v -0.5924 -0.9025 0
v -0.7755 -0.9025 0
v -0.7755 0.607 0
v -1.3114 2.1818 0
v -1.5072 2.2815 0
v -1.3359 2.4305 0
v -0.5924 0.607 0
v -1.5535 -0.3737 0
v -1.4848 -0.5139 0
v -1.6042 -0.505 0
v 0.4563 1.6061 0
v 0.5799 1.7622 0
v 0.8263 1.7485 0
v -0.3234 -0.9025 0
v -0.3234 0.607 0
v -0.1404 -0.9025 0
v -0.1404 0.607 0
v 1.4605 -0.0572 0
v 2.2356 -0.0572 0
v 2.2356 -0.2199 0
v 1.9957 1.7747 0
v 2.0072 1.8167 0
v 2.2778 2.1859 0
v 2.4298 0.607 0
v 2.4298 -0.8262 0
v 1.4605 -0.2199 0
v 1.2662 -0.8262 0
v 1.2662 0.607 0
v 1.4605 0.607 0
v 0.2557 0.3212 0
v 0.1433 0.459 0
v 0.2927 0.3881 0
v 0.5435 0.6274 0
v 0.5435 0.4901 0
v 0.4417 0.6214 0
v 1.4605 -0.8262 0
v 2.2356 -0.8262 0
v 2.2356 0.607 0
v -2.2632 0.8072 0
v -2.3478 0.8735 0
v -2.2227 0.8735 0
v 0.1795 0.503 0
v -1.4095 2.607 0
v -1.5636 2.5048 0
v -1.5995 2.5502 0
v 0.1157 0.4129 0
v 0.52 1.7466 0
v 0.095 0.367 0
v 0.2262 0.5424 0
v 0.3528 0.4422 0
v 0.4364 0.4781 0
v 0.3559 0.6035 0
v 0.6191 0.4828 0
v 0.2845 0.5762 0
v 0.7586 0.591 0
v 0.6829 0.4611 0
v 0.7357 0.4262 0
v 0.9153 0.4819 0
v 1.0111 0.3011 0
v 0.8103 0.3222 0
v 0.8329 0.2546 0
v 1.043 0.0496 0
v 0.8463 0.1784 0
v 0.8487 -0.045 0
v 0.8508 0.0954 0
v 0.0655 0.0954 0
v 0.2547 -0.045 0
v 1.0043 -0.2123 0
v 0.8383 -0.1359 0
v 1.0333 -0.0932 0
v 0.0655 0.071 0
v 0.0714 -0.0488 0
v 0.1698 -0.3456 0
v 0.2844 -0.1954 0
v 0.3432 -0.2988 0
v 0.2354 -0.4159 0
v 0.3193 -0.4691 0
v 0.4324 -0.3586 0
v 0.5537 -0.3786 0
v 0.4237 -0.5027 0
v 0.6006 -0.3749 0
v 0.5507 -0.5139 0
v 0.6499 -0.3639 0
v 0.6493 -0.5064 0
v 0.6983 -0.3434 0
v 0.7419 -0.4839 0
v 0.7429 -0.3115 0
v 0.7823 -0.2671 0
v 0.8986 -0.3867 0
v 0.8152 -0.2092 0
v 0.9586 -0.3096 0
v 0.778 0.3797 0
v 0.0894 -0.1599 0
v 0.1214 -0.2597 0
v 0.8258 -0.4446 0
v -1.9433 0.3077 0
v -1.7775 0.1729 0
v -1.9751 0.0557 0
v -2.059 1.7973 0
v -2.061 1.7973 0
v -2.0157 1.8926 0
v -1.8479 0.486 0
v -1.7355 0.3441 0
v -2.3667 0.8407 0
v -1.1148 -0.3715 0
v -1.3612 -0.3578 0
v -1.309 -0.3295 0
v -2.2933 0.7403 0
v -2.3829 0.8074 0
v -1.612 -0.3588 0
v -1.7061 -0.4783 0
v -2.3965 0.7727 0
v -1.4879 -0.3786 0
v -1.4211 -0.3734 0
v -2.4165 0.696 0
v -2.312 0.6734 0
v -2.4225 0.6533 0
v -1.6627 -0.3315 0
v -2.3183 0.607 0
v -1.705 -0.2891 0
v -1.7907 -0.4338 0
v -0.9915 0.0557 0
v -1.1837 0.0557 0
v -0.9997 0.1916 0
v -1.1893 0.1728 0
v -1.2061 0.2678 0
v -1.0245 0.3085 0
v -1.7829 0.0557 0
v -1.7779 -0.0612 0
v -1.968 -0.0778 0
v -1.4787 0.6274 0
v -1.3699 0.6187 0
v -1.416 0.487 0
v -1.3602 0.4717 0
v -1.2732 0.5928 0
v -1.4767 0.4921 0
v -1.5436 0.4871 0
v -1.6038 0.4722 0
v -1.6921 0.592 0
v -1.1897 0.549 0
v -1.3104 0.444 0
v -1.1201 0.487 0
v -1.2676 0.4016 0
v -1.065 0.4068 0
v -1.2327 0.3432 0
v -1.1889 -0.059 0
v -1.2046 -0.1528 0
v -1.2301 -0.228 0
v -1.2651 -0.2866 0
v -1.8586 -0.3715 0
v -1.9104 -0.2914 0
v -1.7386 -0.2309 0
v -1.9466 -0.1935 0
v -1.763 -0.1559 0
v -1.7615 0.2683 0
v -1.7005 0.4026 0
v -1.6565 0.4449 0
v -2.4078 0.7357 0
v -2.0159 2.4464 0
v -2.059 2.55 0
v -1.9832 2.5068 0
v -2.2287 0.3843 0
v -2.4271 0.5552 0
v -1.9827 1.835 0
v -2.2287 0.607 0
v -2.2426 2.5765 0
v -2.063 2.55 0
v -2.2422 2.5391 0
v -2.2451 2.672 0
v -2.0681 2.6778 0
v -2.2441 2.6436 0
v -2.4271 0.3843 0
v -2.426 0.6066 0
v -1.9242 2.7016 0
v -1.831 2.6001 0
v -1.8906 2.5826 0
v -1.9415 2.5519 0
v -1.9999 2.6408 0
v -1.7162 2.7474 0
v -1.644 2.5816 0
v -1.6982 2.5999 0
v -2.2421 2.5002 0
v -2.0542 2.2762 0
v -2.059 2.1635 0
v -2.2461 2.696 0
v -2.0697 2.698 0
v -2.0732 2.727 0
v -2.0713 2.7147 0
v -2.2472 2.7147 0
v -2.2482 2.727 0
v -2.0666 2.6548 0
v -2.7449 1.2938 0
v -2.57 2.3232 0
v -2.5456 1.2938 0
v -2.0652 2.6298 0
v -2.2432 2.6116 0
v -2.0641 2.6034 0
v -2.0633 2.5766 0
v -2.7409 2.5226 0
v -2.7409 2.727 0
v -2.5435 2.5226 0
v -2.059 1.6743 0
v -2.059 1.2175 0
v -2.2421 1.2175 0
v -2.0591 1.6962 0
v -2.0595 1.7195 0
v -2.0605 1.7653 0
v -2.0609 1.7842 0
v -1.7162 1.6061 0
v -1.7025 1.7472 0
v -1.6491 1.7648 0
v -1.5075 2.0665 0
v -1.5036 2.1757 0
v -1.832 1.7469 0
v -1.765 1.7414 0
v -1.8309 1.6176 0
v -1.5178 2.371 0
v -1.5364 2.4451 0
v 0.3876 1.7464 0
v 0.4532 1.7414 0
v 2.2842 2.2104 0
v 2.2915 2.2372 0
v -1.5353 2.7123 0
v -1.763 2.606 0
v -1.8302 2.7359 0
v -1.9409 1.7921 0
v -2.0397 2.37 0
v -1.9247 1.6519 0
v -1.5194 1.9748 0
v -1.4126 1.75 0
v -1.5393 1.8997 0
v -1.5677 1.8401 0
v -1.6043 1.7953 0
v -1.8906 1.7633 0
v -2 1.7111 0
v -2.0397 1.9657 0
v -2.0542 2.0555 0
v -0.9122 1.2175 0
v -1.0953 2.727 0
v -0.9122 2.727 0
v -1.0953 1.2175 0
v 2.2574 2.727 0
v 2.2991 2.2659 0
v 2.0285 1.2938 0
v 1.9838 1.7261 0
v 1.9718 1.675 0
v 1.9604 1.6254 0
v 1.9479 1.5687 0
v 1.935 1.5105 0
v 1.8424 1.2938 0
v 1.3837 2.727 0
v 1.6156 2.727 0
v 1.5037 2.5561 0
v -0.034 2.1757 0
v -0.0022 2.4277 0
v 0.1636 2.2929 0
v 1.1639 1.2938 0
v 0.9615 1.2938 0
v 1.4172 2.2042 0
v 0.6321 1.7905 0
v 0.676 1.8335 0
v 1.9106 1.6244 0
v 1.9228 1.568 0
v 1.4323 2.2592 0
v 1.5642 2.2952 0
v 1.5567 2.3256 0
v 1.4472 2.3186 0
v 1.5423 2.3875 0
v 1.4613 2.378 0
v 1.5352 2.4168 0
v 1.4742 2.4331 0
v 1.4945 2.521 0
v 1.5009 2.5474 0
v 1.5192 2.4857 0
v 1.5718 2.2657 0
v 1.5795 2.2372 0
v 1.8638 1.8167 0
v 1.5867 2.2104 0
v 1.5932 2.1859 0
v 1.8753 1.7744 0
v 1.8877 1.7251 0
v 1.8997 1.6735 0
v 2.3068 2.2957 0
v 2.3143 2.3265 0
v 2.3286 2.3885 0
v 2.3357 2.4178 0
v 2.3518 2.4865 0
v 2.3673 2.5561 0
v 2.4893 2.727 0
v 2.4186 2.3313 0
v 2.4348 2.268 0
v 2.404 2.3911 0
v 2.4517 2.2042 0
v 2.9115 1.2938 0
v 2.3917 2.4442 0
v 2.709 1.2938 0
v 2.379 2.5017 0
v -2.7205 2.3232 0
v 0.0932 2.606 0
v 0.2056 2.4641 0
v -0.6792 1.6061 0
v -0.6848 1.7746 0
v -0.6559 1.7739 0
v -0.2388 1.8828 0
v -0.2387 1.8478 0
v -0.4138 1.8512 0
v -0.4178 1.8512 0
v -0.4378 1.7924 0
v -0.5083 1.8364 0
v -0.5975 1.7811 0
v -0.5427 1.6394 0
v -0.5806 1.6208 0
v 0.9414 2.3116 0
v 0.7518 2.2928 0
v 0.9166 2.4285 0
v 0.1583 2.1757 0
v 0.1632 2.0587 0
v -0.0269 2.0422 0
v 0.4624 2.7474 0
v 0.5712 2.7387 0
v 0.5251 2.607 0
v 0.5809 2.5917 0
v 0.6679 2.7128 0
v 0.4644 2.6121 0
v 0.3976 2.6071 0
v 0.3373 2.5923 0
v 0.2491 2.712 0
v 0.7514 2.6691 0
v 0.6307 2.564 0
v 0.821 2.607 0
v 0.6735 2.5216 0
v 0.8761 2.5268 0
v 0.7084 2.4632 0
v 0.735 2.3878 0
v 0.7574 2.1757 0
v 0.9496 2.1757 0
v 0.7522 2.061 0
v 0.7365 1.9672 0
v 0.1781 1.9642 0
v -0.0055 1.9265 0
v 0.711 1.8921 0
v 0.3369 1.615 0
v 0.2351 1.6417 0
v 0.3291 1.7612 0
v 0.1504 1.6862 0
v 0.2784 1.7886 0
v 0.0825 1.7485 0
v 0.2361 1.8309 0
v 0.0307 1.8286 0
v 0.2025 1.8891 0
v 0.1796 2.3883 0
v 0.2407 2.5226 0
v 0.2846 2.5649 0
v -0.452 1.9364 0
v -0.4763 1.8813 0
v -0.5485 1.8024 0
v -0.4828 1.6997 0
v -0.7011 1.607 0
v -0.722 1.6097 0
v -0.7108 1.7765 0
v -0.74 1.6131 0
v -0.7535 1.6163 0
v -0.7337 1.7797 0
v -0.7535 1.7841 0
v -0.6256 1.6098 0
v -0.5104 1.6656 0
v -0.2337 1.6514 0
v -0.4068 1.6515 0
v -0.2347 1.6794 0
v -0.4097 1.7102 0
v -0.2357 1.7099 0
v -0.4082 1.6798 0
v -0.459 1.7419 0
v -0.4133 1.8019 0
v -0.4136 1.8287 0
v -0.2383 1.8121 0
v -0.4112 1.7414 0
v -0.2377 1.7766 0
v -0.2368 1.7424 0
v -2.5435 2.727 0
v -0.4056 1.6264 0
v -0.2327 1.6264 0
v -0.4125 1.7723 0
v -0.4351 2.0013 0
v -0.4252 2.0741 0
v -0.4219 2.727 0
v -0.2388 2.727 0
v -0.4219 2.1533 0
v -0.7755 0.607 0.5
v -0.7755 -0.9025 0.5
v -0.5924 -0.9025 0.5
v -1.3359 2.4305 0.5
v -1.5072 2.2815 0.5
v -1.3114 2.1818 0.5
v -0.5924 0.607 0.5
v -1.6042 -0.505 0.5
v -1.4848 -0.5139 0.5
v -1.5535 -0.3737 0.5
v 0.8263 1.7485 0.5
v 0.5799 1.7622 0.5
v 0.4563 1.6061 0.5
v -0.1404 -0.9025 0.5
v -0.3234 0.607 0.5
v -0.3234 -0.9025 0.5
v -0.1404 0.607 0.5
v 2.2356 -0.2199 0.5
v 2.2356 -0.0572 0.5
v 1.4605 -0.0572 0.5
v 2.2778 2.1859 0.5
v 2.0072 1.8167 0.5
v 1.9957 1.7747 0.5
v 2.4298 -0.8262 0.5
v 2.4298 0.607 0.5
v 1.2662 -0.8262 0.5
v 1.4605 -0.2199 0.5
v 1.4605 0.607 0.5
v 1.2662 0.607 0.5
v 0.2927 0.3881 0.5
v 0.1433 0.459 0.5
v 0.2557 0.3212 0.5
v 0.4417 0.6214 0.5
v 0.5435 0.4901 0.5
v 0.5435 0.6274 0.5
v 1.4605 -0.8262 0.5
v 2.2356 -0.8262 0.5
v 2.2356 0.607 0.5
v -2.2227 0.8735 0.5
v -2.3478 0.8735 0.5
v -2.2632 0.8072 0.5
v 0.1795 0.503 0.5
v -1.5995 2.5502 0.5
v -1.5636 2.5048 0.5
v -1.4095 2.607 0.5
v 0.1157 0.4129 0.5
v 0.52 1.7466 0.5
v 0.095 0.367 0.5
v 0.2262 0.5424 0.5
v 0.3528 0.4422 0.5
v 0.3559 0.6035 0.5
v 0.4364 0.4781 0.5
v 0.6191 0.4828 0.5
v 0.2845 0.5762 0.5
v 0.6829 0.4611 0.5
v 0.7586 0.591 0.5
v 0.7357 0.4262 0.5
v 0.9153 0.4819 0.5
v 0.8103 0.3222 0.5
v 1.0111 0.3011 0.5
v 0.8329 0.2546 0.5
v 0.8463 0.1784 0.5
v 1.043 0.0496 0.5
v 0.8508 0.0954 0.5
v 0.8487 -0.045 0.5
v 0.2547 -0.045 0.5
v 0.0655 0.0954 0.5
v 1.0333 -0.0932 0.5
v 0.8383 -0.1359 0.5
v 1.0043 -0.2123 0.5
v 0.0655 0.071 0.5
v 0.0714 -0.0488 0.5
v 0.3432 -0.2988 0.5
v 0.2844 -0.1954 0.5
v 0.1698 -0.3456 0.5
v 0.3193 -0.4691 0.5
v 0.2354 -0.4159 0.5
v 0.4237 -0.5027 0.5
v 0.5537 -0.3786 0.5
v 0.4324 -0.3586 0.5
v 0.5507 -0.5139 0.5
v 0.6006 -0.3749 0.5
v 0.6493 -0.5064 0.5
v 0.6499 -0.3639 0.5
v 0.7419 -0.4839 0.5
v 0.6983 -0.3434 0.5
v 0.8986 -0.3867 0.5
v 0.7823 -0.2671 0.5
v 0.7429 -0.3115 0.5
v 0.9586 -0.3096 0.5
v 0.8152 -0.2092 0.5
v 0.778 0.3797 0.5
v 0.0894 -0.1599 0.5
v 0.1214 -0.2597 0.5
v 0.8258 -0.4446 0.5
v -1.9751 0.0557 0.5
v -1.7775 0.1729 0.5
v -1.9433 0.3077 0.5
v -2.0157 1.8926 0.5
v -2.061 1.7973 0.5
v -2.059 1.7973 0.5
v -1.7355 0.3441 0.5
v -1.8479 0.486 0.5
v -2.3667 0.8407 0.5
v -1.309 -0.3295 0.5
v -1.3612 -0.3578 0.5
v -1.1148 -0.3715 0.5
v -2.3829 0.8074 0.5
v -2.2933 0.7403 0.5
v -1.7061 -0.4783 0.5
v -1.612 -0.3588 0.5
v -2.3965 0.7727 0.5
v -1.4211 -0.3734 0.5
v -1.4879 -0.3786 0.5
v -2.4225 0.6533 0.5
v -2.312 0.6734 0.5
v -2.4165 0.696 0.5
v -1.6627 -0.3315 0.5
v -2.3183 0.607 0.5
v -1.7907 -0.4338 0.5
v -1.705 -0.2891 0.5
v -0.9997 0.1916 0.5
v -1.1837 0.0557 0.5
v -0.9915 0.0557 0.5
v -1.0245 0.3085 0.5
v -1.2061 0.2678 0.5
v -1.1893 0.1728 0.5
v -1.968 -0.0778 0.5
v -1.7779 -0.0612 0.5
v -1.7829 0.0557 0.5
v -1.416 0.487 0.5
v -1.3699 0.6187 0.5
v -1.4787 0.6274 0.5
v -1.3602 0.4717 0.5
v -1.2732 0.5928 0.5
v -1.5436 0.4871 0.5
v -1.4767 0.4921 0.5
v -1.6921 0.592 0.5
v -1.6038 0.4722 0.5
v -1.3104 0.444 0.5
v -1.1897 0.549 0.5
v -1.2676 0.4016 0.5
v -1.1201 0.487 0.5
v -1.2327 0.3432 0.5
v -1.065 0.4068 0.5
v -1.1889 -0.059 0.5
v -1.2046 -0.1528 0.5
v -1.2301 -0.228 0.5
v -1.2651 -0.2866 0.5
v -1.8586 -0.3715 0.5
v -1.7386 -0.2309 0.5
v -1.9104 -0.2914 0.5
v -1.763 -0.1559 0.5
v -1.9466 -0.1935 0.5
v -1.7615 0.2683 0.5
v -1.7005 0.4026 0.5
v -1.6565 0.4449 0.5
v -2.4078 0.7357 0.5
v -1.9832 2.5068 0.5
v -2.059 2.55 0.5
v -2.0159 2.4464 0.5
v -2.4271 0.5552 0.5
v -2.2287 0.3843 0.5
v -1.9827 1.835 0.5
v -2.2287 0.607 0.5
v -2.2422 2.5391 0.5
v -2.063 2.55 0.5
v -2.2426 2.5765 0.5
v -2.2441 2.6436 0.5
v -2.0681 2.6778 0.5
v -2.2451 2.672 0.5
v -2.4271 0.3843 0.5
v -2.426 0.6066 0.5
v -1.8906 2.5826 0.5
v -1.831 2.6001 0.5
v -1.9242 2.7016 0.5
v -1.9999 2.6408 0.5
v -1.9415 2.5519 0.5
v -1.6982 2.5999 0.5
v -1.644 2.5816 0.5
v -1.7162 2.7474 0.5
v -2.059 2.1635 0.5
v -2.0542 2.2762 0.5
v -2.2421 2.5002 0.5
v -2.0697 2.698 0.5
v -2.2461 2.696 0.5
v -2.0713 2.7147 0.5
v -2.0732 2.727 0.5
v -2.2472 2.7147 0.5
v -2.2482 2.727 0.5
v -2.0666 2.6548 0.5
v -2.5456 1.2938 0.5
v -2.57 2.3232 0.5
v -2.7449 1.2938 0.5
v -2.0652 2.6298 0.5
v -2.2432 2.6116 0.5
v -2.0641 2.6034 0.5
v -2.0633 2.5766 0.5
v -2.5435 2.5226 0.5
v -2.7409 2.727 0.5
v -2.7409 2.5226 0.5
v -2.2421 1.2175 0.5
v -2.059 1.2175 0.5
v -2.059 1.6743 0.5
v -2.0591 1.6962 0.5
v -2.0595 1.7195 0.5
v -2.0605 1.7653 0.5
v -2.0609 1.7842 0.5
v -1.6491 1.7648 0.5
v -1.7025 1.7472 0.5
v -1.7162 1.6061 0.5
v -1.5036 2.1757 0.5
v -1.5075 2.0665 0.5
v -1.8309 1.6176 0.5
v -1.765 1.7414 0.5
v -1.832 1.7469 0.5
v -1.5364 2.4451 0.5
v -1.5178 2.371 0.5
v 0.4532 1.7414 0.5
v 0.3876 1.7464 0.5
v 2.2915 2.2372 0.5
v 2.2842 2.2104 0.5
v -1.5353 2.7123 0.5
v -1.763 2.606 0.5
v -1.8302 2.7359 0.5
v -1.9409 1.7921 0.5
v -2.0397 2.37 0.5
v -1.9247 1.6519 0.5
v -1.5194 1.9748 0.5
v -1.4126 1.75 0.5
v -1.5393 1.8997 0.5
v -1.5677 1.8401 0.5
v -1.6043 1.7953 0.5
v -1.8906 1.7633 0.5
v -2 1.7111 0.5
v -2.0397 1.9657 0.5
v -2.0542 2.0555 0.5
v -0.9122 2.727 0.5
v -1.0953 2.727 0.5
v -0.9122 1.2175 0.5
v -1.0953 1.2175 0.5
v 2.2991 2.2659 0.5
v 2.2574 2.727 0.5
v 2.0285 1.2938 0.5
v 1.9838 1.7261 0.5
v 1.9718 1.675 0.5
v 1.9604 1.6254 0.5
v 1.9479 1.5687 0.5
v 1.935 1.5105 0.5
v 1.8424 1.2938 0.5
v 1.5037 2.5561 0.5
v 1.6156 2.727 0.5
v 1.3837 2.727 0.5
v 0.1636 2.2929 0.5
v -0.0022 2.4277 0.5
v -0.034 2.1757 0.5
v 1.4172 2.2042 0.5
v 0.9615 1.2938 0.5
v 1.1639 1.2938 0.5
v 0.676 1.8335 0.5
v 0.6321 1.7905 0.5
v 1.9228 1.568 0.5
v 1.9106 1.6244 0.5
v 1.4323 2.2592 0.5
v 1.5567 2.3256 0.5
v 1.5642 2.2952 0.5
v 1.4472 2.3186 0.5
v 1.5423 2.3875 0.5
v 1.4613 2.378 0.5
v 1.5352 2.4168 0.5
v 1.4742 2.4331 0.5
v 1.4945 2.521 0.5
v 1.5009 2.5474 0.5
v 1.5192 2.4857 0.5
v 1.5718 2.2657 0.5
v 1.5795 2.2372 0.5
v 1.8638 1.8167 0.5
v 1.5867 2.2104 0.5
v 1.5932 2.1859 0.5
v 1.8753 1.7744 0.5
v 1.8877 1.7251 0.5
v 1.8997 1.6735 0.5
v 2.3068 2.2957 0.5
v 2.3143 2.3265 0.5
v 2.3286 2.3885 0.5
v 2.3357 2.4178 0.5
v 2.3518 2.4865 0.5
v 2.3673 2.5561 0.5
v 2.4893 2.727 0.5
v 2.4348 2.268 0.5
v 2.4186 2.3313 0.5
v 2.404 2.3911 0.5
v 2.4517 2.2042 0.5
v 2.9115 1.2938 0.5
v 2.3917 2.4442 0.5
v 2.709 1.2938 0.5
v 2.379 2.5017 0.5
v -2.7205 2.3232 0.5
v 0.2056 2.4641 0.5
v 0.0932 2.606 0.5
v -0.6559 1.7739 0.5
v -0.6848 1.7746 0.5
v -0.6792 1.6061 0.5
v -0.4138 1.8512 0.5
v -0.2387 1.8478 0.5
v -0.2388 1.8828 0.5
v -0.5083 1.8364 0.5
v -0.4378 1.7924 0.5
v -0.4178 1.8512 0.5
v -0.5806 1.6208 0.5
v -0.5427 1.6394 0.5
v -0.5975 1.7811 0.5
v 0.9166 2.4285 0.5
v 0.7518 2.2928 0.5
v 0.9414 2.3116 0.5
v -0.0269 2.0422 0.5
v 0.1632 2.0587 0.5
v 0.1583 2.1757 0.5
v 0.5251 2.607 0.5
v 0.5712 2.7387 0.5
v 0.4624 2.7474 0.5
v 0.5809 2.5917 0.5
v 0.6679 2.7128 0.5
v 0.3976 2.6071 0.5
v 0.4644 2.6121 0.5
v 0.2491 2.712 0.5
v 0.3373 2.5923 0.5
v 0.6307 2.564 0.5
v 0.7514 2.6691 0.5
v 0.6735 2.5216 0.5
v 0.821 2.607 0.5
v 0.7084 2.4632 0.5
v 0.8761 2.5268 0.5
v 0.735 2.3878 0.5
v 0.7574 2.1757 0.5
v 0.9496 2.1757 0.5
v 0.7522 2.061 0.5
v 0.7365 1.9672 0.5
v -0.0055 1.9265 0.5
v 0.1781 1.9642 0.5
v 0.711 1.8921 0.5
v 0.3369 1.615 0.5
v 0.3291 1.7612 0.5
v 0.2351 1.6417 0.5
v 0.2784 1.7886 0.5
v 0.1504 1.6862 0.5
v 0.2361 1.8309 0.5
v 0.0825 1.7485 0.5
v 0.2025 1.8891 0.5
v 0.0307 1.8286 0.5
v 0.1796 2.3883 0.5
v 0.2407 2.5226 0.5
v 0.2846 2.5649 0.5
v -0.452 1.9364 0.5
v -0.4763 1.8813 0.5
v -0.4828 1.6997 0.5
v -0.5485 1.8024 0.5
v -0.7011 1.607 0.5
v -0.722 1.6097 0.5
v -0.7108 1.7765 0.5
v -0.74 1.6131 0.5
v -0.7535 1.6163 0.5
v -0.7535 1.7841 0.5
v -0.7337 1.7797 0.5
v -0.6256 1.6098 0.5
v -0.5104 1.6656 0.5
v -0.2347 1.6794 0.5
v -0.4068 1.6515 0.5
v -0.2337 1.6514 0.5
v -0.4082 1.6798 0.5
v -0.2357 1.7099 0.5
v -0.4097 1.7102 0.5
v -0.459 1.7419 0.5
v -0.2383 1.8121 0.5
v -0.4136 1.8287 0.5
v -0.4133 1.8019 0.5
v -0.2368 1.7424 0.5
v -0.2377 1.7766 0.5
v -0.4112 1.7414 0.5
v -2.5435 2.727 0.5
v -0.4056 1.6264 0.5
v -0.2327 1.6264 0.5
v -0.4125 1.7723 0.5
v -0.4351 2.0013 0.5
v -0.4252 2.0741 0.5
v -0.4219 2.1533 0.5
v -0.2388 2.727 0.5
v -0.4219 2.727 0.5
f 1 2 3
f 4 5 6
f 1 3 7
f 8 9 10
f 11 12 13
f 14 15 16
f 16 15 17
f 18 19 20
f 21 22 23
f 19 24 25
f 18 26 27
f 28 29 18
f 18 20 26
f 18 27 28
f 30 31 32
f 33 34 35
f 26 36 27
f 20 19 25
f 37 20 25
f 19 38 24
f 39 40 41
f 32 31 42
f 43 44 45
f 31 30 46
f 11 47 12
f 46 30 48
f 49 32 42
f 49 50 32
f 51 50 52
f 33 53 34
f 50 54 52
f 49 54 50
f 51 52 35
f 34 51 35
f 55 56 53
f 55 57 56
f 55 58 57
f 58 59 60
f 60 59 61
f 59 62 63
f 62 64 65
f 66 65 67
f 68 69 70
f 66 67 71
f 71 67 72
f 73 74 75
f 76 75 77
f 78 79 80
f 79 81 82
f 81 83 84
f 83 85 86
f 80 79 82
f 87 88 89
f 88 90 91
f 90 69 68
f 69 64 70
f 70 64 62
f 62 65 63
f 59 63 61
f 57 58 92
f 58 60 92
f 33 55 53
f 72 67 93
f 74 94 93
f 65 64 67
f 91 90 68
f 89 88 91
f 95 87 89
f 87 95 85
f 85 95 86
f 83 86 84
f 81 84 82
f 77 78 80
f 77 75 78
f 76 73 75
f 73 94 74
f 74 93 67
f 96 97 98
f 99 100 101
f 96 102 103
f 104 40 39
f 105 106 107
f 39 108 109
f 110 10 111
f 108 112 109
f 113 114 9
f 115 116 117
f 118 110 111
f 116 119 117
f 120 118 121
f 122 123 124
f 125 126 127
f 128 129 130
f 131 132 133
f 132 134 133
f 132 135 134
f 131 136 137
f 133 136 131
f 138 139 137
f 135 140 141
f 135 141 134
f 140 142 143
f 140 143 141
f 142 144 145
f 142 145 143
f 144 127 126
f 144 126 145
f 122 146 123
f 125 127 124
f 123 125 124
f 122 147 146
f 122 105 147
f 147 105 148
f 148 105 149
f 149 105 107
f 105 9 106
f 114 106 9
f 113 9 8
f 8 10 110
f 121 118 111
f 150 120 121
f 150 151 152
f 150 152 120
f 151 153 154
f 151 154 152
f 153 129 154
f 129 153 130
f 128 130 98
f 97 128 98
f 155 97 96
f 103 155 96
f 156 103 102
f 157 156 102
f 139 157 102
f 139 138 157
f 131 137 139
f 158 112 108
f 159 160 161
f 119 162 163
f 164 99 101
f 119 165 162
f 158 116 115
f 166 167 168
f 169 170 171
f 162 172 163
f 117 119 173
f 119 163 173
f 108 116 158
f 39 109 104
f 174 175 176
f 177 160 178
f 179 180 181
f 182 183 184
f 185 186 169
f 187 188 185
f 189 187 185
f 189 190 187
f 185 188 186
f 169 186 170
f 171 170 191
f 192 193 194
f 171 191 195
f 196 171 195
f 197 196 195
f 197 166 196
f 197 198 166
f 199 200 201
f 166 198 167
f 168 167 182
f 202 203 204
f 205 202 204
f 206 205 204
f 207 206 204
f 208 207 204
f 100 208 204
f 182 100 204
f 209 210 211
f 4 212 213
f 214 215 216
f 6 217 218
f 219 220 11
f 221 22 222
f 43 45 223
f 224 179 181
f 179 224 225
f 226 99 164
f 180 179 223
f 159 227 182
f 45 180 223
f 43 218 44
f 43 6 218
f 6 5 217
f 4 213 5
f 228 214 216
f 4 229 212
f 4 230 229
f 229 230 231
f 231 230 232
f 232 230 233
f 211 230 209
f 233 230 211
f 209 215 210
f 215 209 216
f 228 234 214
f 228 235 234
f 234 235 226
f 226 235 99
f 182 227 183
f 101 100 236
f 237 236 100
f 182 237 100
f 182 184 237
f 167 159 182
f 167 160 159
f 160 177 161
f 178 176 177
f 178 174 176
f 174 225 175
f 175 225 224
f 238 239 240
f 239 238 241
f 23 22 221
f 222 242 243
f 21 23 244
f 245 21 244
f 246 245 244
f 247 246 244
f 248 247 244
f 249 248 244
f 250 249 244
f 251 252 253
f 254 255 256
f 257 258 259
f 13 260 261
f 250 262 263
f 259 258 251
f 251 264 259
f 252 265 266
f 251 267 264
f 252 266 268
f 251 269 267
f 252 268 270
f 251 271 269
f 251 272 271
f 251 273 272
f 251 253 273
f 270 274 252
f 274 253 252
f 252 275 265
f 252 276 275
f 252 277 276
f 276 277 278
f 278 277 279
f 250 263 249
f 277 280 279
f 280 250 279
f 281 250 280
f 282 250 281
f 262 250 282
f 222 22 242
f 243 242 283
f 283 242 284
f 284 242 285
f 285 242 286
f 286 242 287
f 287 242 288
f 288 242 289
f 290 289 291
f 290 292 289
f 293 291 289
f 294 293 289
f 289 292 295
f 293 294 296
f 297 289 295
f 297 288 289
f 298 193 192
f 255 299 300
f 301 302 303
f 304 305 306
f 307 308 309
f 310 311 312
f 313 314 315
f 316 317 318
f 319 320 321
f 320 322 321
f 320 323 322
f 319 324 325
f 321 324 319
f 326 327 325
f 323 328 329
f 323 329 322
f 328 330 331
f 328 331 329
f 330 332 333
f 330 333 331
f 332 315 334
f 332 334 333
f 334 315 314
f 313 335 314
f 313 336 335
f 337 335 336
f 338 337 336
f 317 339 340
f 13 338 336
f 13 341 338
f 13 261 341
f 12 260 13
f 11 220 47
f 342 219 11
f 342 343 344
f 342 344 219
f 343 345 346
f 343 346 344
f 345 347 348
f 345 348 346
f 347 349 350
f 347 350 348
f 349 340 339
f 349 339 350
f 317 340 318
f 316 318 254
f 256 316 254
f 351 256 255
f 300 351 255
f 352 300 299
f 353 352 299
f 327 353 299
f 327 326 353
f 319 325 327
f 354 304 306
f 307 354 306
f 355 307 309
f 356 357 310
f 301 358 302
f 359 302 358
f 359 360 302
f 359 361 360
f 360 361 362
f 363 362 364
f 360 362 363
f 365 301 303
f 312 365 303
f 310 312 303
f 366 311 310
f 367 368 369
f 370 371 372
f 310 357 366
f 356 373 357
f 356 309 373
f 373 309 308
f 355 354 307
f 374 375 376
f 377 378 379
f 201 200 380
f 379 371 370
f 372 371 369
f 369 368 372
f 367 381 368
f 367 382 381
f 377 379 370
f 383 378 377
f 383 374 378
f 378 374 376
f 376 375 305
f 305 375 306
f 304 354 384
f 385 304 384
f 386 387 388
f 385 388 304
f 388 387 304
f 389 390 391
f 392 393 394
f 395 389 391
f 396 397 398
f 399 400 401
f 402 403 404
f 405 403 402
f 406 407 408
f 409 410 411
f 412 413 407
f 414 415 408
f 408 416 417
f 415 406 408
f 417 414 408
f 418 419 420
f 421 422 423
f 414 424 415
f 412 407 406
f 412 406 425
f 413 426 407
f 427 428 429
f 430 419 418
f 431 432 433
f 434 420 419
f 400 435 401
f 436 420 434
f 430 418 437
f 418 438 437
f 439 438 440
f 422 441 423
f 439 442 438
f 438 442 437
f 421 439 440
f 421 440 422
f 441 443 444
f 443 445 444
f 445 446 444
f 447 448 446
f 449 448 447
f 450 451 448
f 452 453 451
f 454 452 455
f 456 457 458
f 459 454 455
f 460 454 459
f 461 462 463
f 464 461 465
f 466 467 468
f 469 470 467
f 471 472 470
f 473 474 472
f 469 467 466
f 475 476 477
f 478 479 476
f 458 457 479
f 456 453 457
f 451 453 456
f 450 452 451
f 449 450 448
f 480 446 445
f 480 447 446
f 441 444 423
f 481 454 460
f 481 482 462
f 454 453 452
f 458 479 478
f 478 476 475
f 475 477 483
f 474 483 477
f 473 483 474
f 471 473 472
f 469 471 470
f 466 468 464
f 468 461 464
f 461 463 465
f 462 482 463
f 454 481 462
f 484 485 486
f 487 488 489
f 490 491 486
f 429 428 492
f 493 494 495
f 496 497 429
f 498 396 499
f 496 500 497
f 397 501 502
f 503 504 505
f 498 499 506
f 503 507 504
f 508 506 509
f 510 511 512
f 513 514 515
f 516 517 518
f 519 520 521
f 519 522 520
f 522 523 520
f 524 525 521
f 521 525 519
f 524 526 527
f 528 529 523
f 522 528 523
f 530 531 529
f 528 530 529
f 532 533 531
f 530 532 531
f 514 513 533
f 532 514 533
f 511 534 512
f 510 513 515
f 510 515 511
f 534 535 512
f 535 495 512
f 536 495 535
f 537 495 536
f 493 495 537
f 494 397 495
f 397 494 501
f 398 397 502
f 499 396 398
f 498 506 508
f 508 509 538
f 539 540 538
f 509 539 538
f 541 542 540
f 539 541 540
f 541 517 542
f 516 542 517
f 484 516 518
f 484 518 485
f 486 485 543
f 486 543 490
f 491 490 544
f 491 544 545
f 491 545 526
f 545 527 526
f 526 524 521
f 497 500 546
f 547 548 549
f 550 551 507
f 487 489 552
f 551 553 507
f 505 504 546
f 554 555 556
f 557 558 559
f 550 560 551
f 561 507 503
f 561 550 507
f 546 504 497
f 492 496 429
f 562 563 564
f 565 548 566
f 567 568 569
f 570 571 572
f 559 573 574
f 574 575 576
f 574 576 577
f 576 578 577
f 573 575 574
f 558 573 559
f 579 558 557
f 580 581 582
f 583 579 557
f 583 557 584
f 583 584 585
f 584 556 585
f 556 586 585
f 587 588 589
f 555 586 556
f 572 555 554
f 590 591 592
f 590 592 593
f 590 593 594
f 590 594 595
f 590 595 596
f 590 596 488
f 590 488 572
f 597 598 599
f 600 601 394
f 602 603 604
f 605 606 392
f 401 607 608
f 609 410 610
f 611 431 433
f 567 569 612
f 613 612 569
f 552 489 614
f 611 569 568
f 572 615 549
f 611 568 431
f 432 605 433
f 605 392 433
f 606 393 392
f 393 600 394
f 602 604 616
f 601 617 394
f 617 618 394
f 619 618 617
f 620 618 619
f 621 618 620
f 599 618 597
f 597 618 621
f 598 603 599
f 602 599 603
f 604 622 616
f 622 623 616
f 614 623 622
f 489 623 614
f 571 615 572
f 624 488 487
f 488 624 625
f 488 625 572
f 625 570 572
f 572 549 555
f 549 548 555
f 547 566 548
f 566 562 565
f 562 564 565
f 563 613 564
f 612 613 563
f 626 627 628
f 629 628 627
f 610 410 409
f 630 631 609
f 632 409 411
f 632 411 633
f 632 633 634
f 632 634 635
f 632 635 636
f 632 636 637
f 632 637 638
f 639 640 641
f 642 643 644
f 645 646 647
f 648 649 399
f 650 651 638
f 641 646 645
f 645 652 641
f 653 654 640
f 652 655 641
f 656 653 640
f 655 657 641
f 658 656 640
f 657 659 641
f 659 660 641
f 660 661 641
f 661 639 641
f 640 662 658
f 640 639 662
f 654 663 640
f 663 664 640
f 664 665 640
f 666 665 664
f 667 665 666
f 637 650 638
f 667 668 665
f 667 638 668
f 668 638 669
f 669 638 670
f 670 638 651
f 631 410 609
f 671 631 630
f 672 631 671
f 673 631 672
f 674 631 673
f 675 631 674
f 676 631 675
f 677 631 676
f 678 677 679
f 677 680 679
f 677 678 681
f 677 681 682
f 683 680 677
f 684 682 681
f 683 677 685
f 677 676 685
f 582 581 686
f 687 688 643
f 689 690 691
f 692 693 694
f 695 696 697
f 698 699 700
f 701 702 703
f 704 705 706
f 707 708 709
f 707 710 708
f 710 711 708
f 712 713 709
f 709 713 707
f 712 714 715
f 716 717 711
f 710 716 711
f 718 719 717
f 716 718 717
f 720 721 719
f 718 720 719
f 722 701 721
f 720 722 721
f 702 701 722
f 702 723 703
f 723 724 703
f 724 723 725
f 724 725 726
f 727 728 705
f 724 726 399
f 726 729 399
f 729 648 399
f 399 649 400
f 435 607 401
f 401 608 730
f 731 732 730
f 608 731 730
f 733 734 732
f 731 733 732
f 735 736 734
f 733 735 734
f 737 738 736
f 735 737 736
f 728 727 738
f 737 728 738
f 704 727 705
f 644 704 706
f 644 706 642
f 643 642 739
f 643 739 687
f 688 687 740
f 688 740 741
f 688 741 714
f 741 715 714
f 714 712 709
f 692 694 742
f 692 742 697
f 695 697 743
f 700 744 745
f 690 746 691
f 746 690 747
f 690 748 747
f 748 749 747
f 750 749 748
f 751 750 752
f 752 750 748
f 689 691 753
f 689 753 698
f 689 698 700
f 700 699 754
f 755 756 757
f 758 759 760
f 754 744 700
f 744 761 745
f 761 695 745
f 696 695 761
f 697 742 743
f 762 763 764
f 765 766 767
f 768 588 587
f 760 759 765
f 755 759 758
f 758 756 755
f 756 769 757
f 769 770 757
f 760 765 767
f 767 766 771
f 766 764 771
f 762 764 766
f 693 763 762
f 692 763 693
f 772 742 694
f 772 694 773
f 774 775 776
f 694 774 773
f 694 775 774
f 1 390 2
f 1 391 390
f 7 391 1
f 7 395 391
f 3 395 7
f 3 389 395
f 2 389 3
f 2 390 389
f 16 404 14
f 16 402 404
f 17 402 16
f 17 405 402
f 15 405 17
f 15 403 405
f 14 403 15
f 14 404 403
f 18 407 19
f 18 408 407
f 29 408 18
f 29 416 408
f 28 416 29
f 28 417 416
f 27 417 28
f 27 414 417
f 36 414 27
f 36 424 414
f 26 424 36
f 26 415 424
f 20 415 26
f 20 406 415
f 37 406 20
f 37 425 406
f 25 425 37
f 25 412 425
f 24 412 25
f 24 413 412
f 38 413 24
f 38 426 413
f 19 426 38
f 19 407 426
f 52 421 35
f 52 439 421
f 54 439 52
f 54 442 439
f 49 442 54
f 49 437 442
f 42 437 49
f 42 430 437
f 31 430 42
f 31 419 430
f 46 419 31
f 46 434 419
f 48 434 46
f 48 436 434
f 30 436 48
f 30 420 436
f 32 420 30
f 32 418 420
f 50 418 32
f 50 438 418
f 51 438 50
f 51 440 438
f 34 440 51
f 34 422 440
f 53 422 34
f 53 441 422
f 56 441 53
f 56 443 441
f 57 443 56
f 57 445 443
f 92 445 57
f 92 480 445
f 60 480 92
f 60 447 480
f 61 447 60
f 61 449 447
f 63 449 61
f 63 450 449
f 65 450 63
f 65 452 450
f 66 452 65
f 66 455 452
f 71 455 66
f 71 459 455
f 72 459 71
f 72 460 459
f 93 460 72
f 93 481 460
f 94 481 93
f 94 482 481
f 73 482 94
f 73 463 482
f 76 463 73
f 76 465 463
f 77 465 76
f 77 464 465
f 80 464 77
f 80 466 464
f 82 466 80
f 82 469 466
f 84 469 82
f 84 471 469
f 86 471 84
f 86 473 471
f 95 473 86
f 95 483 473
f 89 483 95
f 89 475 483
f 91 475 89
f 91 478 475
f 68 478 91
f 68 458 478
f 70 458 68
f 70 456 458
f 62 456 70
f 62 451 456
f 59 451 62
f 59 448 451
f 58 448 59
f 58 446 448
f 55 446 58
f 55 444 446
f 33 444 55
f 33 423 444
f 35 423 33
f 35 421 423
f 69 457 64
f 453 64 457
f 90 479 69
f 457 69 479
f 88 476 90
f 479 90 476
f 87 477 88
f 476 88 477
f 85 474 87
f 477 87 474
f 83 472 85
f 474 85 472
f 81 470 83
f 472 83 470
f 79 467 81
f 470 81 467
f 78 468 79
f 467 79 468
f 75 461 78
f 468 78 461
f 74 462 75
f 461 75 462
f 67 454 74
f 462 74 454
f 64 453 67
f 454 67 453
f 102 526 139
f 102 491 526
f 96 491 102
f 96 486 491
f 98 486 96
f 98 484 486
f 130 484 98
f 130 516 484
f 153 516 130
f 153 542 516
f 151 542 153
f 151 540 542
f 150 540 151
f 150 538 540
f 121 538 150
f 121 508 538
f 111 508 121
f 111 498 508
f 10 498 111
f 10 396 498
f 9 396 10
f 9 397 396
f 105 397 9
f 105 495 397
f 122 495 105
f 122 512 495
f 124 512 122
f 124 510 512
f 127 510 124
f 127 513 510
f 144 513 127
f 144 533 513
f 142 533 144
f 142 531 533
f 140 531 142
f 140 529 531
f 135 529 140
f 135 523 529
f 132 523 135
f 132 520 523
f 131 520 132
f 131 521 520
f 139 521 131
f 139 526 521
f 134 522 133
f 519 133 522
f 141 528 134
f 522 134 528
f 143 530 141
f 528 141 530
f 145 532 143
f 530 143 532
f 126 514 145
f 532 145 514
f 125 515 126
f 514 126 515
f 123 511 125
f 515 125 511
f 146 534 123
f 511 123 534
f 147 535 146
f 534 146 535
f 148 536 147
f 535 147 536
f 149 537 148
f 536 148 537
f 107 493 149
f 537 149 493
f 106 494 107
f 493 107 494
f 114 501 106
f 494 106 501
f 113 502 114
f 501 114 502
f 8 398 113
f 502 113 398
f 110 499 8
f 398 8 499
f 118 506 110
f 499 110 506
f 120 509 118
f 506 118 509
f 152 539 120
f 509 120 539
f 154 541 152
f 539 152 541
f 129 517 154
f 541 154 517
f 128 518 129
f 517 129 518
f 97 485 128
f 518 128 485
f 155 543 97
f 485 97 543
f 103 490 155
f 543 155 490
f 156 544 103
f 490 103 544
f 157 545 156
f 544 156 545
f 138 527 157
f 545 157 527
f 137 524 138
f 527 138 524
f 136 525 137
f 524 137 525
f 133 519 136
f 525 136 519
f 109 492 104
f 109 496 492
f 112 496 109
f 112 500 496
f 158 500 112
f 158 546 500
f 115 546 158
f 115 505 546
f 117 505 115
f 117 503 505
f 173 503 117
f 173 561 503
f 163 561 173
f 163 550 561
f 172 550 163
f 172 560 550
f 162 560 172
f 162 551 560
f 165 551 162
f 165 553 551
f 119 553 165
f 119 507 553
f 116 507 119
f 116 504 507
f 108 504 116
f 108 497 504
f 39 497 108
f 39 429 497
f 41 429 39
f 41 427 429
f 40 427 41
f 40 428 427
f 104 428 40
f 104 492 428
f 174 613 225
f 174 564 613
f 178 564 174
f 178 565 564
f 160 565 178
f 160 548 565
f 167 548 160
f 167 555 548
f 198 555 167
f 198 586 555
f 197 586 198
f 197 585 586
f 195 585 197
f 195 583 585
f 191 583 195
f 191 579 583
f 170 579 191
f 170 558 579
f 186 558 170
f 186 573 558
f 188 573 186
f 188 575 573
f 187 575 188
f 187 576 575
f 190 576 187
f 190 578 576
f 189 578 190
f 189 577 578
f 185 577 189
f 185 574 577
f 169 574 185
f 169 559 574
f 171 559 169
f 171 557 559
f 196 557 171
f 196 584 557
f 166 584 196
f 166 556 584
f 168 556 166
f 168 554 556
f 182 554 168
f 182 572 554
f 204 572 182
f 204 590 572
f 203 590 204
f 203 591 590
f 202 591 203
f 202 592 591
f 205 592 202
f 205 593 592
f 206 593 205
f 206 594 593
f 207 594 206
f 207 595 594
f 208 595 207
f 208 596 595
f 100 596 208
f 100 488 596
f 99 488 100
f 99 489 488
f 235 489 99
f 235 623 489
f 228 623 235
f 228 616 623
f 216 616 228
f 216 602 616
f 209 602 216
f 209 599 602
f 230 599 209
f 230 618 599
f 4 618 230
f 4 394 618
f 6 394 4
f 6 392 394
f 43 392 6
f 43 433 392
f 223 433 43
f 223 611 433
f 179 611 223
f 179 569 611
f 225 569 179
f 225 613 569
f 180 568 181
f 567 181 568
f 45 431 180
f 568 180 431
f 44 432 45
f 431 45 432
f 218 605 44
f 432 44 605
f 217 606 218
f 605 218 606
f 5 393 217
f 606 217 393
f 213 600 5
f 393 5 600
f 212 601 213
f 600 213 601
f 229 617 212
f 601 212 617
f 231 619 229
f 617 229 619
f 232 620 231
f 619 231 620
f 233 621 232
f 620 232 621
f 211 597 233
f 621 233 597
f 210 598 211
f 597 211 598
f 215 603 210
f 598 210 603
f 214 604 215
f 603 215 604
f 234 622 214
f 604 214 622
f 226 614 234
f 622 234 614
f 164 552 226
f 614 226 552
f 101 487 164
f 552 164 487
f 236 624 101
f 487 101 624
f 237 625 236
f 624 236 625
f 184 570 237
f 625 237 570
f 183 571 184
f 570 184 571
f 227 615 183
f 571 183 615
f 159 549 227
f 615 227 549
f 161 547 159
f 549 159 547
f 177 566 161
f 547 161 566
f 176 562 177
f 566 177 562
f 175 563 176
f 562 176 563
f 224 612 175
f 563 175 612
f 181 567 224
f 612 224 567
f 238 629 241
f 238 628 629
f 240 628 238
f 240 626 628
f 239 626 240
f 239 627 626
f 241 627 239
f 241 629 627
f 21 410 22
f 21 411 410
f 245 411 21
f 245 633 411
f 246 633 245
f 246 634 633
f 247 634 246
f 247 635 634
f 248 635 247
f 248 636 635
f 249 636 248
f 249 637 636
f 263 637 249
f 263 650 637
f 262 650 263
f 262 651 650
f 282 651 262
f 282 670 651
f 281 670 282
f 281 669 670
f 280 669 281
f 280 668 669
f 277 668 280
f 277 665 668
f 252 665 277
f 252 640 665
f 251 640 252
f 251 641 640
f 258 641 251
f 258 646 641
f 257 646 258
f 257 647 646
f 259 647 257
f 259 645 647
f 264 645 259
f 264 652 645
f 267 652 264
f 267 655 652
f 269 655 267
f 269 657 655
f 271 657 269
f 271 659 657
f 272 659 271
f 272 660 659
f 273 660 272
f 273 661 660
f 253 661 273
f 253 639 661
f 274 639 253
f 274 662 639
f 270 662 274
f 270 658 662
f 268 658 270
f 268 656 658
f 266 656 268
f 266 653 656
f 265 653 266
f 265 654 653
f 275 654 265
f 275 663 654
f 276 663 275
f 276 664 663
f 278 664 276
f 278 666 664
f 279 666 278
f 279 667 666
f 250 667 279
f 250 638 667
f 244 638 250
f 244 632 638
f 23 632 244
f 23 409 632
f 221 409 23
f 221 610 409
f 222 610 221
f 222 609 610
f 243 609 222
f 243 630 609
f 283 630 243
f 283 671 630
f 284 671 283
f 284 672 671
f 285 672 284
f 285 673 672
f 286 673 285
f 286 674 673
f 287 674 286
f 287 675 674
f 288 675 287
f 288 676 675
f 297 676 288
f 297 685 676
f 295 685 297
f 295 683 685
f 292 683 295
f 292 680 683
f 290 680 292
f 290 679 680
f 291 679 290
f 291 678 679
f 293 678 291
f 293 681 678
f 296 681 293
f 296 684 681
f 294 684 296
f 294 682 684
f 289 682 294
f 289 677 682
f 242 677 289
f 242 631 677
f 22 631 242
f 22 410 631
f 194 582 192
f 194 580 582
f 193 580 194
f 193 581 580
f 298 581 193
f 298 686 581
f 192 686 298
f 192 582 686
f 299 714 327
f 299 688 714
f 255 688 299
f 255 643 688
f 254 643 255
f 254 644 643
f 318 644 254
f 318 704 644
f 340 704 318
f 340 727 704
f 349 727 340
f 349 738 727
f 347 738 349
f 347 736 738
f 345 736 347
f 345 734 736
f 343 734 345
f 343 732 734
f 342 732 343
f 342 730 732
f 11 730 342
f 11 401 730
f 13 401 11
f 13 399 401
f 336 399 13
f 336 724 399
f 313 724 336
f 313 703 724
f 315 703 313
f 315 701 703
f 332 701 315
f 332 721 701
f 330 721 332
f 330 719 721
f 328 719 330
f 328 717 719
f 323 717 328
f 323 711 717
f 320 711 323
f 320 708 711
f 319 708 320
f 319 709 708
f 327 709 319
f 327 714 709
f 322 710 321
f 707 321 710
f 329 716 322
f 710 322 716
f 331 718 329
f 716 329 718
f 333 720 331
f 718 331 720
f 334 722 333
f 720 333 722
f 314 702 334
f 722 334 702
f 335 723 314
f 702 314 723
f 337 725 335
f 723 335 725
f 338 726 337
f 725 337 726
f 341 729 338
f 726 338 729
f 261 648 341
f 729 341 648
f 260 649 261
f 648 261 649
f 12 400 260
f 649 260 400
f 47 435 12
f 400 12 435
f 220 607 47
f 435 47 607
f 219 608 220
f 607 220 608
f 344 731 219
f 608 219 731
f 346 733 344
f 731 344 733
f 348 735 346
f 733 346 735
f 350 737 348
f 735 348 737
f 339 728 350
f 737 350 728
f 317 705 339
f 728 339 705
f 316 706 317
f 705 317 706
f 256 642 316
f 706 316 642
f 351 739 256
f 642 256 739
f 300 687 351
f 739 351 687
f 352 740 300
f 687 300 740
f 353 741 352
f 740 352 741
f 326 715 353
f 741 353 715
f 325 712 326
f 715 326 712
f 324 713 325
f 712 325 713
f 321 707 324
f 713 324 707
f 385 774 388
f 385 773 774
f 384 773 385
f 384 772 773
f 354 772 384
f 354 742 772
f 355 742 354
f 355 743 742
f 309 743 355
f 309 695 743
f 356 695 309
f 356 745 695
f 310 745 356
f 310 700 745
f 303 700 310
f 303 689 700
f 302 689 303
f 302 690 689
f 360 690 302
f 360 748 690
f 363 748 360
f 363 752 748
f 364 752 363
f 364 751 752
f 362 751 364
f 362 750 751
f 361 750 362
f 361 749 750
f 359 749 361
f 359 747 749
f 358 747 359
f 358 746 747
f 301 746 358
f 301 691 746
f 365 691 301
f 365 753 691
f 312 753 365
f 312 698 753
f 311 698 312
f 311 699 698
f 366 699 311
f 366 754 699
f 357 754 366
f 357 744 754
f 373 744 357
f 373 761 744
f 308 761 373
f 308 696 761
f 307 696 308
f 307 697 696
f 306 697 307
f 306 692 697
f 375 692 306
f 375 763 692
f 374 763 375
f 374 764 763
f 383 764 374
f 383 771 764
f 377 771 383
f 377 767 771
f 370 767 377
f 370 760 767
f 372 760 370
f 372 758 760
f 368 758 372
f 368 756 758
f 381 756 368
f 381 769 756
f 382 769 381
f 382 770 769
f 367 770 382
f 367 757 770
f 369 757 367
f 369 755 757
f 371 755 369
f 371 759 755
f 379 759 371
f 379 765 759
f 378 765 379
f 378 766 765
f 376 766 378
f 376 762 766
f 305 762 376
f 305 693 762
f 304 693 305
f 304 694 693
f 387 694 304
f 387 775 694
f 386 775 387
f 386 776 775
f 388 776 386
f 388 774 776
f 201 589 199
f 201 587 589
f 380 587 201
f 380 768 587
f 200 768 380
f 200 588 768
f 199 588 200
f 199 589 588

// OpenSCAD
linear_extrude(0.5)
  rotate(180) union() {
    text("Hello,", size=1.5, valign="center", halign="center");
    translate([0, -2, 0])
      text("World!", size=1.5, valign="center", halign="center");
  }
